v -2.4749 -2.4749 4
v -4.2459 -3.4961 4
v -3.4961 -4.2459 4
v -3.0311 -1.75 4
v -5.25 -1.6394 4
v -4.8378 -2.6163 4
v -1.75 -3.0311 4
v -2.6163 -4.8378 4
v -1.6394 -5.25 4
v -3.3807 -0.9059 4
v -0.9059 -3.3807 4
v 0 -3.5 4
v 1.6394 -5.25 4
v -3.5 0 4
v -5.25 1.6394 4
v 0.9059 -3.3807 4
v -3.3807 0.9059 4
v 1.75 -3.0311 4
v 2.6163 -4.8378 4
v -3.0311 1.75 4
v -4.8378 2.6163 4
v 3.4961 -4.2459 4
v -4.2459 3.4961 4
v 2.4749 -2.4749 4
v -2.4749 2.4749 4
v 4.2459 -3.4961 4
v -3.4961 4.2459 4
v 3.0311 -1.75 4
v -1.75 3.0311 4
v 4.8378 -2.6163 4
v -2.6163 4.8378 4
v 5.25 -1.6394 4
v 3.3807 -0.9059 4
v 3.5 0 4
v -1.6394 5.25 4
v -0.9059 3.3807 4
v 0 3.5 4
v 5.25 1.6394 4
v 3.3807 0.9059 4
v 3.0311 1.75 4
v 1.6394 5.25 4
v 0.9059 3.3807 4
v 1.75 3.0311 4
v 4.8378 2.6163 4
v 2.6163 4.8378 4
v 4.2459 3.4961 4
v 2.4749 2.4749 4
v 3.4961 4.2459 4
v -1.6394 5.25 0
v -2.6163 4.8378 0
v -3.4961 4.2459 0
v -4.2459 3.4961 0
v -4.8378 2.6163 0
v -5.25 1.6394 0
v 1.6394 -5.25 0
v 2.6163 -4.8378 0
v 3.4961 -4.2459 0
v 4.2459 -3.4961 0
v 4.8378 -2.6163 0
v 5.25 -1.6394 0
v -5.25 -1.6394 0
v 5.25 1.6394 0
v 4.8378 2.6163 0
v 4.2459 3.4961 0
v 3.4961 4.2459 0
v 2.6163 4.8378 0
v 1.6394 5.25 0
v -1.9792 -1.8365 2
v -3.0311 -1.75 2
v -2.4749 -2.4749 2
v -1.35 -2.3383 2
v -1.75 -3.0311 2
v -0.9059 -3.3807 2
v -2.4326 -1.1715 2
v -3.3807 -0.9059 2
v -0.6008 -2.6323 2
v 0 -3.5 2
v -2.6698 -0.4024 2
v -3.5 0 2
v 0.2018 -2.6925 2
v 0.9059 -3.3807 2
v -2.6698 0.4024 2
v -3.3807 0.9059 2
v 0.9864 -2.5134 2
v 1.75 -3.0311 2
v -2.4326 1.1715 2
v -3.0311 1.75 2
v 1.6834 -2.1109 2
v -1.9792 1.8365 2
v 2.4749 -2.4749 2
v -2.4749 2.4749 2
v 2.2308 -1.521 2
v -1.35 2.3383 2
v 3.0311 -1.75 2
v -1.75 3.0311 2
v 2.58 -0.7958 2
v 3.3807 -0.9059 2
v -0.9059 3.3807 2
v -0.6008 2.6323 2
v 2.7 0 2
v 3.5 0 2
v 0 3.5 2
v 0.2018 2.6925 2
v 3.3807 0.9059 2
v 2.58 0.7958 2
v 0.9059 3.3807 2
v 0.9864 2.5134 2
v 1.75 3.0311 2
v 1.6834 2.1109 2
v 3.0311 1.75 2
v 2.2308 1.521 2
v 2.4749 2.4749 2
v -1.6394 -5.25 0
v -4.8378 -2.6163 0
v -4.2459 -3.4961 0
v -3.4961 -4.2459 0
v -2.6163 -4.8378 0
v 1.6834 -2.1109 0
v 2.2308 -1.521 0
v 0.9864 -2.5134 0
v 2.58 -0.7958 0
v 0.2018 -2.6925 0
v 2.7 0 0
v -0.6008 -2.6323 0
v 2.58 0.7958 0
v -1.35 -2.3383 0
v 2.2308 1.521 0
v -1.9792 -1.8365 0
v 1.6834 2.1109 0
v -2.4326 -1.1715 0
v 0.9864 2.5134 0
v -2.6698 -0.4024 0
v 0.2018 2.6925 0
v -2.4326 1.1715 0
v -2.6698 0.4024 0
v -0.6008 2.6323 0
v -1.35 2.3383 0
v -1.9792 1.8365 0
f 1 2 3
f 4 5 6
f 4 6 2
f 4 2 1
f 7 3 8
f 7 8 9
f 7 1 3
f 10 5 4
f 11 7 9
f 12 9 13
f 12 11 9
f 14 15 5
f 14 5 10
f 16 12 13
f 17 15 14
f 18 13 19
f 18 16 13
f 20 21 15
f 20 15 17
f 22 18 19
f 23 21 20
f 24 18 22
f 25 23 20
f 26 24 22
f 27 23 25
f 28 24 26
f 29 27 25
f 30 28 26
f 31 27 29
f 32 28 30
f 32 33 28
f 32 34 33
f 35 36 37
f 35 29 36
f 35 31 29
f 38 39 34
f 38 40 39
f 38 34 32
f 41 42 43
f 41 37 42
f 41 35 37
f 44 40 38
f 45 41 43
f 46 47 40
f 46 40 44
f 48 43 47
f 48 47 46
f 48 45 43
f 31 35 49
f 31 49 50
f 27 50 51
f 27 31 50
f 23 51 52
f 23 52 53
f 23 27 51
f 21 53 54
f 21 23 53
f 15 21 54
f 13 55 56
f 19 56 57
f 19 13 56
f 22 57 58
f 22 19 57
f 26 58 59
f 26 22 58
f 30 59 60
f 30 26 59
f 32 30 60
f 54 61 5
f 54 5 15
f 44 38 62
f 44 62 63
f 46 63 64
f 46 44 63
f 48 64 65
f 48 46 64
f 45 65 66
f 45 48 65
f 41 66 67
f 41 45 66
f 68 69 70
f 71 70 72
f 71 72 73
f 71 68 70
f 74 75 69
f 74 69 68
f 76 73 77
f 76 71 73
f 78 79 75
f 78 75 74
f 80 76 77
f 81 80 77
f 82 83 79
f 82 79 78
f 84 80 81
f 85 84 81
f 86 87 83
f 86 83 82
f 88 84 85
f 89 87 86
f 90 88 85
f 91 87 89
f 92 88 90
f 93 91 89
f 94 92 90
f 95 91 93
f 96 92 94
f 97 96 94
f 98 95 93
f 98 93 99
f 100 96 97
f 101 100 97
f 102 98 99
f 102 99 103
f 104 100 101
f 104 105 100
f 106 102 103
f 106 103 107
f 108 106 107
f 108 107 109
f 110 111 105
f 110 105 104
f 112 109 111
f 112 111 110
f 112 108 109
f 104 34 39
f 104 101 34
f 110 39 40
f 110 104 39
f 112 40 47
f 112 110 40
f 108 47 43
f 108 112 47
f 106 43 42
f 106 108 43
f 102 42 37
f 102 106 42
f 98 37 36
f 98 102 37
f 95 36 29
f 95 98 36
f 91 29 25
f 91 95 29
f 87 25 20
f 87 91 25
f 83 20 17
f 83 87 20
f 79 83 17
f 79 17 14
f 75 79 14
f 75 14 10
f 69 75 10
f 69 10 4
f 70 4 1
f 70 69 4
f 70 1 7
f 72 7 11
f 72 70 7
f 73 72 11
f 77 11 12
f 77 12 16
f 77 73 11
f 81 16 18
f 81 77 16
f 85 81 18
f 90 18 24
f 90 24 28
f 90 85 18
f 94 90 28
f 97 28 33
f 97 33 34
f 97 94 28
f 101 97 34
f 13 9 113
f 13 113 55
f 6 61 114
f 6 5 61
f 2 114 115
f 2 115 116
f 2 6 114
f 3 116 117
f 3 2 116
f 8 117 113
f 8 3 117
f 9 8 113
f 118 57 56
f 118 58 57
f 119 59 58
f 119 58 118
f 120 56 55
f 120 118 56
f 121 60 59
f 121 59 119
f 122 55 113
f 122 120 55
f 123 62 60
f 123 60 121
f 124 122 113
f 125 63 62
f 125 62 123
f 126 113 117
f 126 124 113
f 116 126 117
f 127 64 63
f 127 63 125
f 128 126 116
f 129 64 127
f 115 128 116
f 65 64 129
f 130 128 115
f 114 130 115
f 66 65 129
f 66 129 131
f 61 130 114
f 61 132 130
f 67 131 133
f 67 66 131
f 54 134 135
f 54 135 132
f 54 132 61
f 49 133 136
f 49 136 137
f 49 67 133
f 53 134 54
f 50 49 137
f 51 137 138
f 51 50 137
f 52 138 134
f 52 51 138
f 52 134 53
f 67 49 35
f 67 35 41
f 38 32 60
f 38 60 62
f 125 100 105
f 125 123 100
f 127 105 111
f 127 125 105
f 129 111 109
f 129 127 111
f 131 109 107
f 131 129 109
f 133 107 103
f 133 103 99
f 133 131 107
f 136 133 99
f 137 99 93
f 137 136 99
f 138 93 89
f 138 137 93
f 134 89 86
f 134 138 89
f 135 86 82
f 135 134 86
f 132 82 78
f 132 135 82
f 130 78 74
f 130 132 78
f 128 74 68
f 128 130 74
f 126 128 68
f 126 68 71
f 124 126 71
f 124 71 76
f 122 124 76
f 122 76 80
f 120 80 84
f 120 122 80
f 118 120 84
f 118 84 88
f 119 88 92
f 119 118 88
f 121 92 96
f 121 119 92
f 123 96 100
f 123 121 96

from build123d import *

# Parameters (mm, degrees)
F2_W     = 11.5
F2_H     = 11.5
F2_W_2   = 10.5
F2_H_2   = 10.5
F3_DEPTH = 25


with BuildPart() as f1:
    # F0 (on Front) → F1 (revolve)
    with BuildSketch(Plane.XZ):
        Polygon((5.5, 4), (3.5, 4), (3.5, 2), (2.7, 2), (2.7, 0), (5.5, 0), align=None)
    revolve(axis=Axis((0, 0, 5.877999), (0, 0, 1)))

    # F2 (on Top) → F3 (cut)
    with BuildSketch(Plane.XY):
        Rectangle(F2_W, F2_H)
        Rectangle(F2_W_2, F2_H_2, mode=Mode.SUBTRACT)
    extrude(amount=F3_DEPTH, mode=Mode.SUBTRACT)


solid = f1.part
